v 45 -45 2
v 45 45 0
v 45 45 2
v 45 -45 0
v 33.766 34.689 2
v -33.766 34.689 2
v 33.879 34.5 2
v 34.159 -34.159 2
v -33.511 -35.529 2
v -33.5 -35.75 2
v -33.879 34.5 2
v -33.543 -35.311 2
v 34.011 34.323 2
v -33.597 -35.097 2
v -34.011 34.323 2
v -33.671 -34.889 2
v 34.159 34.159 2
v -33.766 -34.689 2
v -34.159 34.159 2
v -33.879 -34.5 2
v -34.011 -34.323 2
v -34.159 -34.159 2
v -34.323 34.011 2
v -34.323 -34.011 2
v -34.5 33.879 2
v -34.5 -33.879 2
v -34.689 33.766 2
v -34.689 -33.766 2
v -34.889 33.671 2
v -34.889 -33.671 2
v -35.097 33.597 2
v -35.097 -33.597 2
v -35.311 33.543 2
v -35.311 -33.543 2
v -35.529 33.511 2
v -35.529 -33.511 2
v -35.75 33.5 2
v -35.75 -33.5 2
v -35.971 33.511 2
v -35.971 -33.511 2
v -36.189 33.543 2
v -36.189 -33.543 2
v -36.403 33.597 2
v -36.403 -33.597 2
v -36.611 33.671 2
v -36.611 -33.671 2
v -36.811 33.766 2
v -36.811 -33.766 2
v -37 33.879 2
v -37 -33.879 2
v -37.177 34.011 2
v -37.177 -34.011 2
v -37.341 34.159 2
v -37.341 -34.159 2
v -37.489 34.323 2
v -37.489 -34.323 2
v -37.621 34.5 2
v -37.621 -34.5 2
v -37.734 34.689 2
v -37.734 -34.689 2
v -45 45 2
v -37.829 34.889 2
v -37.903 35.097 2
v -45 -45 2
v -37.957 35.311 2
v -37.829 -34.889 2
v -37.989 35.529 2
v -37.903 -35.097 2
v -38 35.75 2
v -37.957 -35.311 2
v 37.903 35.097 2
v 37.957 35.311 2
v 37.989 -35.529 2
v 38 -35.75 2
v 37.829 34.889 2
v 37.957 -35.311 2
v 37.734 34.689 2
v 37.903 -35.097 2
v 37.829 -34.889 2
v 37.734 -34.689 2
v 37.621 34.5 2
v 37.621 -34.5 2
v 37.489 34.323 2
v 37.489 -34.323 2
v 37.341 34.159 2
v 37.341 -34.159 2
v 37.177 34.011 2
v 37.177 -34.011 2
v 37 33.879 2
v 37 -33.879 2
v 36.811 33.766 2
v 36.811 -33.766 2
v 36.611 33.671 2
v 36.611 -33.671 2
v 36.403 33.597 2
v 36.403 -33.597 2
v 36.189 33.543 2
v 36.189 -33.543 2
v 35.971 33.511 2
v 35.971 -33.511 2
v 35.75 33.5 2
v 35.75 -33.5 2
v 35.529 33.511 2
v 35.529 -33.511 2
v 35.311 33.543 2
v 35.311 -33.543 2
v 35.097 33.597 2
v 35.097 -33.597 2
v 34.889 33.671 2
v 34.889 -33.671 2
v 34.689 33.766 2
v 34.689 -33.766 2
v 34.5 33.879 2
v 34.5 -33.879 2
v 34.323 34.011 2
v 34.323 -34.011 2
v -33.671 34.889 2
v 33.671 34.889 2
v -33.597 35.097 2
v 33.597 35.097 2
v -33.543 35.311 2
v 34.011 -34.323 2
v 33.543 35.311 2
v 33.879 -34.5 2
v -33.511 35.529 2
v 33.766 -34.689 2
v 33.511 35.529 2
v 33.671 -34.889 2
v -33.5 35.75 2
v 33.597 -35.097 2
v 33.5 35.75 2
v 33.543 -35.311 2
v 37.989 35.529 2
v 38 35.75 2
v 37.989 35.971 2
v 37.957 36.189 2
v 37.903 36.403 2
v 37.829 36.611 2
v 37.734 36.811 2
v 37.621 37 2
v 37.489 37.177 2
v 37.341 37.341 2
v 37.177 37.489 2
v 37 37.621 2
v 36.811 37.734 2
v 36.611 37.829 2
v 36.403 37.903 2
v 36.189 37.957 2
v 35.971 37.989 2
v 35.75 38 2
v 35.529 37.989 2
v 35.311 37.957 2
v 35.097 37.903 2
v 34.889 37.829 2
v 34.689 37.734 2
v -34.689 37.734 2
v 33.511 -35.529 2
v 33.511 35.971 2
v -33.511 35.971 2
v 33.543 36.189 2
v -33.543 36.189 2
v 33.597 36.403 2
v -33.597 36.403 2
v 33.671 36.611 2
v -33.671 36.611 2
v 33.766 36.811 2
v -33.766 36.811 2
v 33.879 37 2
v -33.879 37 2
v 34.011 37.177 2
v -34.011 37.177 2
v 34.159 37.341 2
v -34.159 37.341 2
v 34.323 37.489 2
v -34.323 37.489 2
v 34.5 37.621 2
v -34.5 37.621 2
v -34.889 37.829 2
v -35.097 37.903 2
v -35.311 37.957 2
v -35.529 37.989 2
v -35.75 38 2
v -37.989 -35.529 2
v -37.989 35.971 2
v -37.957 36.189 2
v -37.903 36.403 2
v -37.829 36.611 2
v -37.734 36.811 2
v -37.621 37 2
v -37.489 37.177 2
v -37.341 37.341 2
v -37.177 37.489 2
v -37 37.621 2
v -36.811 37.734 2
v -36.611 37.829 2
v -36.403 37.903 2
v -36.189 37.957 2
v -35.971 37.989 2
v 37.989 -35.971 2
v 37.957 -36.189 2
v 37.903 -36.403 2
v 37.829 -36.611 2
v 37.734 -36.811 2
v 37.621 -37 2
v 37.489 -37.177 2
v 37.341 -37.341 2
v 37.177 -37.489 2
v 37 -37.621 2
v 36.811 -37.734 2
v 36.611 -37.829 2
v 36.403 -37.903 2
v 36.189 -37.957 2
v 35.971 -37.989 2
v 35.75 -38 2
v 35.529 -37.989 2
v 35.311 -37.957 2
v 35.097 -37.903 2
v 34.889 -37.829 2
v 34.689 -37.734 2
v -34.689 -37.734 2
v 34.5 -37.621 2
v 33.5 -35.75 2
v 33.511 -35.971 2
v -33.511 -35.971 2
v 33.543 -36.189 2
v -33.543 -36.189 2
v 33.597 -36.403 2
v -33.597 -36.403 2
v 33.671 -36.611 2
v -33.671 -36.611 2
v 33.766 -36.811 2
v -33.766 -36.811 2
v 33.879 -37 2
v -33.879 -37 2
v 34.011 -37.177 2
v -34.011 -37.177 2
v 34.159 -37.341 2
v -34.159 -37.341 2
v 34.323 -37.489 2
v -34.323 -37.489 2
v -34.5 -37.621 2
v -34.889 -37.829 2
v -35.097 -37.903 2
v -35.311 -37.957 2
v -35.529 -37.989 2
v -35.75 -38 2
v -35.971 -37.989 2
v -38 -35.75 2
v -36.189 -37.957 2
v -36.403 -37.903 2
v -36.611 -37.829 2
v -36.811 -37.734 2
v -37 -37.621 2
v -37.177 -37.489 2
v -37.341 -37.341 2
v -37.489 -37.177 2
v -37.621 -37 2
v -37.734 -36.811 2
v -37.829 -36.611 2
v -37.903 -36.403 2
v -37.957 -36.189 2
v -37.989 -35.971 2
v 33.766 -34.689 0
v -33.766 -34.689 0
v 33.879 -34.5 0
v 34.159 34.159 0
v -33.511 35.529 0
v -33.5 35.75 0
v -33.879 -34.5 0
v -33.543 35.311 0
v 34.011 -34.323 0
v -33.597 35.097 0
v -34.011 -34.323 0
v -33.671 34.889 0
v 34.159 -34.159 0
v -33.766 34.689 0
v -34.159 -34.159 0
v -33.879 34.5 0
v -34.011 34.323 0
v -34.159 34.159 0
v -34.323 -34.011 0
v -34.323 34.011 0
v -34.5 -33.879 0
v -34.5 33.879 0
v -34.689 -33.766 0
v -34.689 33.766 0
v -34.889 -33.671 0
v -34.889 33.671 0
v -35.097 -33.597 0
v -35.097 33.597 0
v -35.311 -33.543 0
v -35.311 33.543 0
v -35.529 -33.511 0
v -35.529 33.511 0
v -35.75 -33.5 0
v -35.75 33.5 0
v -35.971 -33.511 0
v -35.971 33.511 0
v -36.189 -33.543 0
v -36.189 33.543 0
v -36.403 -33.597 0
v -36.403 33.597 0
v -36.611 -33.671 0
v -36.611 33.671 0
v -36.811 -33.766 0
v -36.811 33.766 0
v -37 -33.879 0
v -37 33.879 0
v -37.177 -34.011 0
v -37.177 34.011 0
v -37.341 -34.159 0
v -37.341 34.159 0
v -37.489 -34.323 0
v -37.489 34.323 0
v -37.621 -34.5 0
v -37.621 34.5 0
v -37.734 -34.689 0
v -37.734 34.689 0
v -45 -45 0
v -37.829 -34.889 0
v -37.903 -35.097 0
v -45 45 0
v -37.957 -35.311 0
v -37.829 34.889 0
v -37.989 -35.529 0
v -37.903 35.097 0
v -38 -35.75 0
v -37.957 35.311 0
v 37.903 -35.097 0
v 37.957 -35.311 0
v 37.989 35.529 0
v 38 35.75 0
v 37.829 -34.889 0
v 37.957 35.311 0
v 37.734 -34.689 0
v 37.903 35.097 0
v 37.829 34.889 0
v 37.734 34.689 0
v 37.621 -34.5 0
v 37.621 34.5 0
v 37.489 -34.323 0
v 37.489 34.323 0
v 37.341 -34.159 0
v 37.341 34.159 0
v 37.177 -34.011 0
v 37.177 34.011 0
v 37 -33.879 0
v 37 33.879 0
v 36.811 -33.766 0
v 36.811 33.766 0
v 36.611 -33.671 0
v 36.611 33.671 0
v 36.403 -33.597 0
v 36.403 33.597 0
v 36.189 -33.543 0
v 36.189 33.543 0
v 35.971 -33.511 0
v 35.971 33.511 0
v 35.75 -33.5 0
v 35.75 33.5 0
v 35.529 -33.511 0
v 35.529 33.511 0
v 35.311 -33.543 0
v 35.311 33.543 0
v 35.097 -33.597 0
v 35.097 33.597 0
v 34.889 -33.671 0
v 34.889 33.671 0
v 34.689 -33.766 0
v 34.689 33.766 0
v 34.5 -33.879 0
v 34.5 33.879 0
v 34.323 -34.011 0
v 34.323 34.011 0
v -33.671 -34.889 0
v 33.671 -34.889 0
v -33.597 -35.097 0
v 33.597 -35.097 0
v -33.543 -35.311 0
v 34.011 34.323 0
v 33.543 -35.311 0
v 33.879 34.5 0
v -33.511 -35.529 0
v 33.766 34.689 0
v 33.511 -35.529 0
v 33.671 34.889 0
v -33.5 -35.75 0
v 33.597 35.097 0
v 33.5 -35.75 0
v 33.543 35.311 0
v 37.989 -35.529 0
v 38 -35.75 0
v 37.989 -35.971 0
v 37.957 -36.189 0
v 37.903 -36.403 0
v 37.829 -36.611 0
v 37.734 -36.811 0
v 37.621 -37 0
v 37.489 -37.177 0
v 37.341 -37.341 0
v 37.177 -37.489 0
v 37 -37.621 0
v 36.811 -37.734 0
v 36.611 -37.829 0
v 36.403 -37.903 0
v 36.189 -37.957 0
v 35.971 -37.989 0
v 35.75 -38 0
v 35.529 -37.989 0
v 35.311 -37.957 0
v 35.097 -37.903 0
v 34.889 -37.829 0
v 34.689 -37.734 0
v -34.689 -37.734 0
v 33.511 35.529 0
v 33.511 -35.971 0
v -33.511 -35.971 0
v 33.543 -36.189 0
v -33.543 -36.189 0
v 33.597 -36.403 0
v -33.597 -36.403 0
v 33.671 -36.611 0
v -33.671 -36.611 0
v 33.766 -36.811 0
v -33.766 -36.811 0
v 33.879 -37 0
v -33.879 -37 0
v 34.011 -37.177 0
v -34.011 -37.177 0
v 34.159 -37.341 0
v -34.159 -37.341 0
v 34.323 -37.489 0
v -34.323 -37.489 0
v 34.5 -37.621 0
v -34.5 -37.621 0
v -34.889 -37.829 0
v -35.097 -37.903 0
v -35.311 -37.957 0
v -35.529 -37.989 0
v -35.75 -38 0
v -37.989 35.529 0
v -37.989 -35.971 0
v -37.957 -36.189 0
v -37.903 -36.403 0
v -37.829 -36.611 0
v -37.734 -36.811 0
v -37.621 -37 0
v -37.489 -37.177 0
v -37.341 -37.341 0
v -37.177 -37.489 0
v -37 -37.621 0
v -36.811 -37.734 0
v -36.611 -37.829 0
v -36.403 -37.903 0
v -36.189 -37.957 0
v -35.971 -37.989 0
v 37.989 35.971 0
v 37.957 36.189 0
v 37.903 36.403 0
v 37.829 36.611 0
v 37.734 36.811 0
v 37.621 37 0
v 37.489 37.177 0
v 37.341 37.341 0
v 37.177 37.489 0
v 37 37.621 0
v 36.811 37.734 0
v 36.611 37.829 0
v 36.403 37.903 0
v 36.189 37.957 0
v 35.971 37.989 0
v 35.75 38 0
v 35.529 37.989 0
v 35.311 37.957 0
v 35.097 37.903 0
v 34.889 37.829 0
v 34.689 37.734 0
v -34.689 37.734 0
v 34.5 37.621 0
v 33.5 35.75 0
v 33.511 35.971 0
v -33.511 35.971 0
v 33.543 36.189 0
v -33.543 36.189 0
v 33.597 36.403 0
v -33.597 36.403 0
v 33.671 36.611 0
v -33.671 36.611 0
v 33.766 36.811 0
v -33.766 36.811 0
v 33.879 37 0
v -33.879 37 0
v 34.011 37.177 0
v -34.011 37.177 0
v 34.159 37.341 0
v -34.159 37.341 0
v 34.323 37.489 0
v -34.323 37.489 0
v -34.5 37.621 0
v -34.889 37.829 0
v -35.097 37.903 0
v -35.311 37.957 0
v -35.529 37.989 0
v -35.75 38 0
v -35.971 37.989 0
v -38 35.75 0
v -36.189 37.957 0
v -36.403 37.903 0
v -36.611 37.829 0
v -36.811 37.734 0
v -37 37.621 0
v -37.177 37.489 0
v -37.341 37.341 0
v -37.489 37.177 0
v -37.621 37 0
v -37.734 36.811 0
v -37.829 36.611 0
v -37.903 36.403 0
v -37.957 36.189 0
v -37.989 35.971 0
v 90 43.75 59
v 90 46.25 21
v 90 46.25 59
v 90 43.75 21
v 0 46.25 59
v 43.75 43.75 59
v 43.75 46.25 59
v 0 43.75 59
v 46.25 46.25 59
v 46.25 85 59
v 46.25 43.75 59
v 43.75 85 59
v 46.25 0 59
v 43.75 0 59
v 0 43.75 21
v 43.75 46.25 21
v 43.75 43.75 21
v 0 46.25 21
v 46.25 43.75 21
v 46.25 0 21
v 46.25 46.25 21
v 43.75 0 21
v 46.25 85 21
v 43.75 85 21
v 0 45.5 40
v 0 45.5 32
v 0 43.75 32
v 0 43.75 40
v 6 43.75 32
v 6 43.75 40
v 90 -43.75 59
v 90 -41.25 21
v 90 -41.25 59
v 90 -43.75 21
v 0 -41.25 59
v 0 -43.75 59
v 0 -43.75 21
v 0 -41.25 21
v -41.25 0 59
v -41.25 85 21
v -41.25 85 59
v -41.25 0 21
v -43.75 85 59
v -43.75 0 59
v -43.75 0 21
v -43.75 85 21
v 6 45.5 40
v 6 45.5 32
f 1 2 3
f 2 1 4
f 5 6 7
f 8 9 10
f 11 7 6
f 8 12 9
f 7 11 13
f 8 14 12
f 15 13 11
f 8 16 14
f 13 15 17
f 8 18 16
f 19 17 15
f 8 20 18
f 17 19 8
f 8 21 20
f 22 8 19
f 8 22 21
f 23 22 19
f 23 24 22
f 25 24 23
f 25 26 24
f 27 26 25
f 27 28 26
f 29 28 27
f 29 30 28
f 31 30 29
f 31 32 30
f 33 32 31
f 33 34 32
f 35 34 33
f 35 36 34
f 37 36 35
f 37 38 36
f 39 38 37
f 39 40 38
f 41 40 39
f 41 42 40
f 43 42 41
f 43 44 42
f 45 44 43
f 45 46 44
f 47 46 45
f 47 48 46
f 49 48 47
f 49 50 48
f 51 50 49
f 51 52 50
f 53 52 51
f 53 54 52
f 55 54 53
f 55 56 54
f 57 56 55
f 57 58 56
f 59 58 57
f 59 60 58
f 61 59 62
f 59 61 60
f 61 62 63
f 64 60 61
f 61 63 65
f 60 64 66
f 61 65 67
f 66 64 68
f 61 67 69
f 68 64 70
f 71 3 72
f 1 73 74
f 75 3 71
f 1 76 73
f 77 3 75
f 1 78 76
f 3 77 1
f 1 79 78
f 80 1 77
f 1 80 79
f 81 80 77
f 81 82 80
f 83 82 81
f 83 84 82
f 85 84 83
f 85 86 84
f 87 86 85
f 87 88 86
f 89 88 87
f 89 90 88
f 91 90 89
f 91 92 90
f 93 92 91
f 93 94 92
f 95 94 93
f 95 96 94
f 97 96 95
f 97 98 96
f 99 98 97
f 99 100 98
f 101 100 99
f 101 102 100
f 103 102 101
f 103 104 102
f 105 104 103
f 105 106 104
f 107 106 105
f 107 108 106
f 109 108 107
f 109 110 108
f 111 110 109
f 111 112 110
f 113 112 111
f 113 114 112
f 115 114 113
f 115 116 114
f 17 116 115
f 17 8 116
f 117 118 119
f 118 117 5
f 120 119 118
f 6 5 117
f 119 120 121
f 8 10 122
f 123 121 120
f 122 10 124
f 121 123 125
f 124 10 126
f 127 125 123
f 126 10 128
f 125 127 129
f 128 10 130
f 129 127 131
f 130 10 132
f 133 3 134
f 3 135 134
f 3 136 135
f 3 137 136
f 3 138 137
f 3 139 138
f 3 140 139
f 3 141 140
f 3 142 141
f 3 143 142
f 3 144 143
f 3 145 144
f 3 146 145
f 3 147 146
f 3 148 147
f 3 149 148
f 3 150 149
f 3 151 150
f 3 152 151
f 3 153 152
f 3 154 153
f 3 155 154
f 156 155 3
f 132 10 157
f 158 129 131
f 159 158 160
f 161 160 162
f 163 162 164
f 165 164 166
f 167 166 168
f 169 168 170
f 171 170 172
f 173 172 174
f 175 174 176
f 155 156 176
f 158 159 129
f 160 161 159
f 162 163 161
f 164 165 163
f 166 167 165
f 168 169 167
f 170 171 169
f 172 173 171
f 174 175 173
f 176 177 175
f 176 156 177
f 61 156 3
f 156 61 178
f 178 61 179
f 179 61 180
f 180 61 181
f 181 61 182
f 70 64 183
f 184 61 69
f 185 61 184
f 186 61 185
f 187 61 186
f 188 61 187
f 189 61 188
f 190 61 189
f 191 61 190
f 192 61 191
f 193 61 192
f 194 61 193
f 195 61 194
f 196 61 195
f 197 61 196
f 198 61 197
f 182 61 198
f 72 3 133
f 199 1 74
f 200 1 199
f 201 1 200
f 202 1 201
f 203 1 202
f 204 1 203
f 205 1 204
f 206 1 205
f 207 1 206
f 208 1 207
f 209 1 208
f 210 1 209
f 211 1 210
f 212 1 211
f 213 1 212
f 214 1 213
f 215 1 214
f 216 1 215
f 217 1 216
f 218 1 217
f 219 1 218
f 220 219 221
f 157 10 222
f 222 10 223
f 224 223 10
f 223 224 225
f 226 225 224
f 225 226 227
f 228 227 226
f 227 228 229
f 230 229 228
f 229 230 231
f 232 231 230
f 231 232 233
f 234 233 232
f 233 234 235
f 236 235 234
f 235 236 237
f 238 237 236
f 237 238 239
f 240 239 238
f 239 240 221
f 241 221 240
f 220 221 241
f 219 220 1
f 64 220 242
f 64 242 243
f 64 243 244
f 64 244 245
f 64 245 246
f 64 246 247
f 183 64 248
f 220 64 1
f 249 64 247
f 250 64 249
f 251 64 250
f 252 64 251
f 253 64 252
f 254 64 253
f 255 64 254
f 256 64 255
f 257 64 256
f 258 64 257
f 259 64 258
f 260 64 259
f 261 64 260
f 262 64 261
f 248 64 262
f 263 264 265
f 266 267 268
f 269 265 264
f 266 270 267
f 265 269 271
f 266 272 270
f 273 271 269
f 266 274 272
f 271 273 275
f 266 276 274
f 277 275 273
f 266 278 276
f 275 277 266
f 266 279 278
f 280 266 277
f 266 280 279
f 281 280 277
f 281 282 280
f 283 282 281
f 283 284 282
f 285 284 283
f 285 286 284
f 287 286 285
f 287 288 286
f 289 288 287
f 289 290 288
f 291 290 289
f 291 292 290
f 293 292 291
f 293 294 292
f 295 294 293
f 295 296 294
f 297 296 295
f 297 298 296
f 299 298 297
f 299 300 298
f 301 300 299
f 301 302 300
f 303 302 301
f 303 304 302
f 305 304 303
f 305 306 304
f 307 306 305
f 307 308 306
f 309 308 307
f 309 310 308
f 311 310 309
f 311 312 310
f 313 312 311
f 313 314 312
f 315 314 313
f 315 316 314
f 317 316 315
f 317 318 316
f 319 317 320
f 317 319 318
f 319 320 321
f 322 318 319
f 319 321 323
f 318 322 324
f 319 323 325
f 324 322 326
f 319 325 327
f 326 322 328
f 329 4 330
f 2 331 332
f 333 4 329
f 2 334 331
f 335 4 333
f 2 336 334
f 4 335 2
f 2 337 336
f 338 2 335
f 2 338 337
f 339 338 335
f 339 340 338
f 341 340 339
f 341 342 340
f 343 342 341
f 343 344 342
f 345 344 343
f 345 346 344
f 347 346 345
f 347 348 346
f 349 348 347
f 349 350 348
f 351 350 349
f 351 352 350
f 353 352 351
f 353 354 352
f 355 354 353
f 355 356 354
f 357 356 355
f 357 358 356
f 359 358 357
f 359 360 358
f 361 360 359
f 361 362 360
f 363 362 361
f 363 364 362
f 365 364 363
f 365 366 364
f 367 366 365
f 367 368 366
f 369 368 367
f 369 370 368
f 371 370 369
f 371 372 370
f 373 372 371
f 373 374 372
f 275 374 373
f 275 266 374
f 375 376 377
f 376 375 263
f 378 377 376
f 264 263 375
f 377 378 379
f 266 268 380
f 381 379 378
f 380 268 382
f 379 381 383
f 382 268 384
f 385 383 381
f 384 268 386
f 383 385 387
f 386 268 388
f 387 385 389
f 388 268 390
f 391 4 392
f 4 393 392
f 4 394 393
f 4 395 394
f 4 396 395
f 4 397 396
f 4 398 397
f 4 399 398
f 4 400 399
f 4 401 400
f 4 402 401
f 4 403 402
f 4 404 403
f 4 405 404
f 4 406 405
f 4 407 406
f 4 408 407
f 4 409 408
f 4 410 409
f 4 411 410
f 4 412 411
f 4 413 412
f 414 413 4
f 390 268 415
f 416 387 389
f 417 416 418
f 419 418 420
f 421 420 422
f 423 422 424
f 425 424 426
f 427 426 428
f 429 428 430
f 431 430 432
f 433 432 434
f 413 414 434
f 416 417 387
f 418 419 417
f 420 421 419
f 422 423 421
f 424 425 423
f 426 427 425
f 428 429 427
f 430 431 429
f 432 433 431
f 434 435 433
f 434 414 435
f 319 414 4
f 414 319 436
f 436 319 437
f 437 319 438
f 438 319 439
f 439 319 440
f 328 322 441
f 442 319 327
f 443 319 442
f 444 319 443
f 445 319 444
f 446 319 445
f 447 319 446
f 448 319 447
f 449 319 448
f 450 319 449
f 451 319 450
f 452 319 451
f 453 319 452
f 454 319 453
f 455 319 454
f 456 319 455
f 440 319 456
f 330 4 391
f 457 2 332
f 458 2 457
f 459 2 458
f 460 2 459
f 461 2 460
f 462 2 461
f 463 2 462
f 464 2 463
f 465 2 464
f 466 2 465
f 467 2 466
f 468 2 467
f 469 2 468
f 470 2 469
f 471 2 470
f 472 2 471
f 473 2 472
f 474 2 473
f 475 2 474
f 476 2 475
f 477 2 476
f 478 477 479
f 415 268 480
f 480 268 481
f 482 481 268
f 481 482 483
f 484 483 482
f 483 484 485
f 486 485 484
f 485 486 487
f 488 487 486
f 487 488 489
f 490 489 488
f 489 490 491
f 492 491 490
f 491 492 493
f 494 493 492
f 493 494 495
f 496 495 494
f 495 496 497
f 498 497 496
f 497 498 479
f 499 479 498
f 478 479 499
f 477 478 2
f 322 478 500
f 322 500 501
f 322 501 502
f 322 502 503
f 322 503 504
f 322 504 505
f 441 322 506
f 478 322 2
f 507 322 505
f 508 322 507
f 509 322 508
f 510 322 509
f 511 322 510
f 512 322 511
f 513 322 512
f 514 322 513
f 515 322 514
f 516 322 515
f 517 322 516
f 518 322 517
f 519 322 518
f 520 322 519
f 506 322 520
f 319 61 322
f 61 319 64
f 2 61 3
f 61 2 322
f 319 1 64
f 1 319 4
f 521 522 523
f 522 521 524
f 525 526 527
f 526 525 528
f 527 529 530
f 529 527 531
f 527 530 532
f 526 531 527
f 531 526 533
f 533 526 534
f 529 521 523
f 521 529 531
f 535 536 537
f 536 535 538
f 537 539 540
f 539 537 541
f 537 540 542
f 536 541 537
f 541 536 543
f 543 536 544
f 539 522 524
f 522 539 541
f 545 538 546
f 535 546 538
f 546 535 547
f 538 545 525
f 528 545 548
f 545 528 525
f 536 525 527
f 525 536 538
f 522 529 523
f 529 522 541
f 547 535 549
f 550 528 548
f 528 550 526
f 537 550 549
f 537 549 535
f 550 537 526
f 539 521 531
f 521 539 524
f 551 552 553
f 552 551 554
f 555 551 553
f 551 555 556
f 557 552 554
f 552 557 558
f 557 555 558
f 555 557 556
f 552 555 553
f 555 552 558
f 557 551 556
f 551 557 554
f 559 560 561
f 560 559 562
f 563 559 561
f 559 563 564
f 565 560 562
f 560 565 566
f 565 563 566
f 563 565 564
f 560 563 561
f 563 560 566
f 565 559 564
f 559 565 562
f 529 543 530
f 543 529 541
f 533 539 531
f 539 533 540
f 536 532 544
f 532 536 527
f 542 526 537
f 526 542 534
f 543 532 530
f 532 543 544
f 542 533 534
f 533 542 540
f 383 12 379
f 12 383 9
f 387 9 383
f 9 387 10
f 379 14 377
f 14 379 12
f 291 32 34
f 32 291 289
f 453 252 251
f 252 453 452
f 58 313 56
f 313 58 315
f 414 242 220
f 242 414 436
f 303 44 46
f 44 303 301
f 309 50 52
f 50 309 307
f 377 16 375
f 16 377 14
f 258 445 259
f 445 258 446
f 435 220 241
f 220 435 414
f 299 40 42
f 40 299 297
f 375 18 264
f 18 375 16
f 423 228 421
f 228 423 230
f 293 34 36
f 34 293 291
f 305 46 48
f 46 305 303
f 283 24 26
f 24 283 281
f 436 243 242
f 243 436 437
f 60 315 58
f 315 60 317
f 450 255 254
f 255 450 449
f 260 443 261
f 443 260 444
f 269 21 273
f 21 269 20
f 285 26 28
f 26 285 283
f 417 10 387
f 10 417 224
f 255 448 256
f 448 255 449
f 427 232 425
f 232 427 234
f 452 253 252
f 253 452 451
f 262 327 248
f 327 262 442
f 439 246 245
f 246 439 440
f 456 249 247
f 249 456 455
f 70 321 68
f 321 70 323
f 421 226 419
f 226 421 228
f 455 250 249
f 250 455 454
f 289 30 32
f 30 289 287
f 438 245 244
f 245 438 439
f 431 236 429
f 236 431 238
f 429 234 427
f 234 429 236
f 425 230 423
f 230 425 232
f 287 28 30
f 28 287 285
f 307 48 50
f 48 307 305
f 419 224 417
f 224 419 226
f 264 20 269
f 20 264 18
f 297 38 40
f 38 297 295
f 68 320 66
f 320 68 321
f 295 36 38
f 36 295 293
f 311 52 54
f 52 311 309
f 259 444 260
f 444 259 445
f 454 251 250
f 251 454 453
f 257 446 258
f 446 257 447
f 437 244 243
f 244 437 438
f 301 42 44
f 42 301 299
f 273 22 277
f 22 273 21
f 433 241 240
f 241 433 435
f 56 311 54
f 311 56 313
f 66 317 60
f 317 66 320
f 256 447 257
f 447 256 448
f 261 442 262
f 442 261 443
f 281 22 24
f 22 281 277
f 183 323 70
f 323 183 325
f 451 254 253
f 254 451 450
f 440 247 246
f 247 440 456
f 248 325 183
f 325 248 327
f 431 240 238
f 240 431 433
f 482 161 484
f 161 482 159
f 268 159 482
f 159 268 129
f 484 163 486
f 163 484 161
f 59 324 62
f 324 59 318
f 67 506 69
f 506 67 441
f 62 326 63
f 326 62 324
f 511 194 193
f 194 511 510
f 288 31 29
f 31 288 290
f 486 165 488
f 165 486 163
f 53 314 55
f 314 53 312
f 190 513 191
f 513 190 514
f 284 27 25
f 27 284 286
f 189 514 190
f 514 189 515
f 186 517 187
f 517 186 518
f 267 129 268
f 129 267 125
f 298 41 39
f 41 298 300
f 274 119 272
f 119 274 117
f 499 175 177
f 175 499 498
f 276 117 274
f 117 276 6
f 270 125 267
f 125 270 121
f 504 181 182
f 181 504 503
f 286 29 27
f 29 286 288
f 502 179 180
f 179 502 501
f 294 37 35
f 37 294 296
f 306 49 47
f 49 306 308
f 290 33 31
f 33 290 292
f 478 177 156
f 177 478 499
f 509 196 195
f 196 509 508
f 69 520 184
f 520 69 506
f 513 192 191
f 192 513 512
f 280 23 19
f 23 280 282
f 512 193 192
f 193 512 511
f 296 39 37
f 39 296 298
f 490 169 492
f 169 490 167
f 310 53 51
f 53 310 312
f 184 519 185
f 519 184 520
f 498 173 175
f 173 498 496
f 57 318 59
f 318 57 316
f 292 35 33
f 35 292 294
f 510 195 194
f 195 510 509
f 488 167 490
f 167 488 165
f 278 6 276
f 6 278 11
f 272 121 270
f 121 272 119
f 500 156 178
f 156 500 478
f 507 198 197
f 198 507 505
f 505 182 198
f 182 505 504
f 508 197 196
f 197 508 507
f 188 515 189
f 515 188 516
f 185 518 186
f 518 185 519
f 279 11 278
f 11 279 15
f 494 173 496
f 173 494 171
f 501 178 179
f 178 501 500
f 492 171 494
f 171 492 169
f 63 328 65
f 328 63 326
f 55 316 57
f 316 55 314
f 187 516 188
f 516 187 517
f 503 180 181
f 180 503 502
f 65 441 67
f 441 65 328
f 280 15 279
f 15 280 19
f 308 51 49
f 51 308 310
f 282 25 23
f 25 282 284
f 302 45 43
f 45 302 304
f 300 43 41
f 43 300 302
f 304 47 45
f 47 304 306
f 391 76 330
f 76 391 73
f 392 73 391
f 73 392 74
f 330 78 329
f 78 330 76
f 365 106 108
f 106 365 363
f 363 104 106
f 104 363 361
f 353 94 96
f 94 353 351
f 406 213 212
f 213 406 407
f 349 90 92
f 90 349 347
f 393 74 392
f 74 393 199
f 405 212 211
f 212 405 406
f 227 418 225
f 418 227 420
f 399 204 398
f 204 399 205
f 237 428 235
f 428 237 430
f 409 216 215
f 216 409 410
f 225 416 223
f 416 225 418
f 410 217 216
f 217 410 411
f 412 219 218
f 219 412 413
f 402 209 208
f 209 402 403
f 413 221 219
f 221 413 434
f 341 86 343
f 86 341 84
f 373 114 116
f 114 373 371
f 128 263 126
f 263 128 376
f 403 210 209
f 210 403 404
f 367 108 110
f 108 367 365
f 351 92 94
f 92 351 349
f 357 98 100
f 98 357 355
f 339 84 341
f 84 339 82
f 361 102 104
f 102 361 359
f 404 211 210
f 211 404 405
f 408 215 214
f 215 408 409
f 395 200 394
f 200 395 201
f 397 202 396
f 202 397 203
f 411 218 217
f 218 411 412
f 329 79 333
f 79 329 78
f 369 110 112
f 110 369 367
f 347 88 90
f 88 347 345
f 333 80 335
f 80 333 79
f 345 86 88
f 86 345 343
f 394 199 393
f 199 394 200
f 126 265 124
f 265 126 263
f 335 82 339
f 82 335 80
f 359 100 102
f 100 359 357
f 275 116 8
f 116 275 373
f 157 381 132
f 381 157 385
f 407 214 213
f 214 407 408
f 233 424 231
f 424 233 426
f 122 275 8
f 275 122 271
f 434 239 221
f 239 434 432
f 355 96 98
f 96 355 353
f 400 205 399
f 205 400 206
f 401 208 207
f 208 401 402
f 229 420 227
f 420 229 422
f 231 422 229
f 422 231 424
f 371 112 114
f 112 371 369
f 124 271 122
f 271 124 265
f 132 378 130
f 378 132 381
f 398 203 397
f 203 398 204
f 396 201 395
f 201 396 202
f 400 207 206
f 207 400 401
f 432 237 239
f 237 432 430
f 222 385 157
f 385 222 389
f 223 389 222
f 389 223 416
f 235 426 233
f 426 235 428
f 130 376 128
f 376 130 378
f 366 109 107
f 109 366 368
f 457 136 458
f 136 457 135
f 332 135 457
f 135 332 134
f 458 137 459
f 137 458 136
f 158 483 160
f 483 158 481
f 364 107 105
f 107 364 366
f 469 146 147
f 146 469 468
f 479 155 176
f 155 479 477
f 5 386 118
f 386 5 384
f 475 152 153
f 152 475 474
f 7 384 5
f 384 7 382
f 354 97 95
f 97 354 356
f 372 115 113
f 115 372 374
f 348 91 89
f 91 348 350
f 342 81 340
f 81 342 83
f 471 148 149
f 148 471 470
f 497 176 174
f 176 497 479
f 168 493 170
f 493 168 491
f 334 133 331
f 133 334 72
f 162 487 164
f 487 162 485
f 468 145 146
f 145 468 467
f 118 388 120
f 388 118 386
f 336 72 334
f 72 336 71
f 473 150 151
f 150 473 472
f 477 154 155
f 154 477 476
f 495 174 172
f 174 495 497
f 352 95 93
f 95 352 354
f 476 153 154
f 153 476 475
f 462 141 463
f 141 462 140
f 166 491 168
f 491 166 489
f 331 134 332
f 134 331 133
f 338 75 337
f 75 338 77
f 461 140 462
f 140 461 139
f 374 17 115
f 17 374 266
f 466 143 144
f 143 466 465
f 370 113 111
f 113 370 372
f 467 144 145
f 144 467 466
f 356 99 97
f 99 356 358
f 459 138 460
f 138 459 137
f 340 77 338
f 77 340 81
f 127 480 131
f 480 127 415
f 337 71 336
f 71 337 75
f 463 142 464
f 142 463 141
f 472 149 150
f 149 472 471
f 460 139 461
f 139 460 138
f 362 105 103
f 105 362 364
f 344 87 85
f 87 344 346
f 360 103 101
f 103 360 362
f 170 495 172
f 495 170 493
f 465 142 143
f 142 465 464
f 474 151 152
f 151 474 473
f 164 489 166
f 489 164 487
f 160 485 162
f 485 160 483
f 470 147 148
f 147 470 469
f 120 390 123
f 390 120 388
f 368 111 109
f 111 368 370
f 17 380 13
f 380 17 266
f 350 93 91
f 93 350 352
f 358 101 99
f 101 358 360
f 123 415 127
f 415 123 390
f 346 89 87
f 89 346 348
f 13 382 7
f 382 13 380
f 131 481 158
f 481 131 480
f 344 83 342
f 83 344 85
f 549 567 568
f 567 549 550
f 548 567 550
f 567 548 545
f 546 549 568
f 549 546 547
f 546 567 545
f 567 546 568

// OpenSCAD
// Dimensions (mm)
top_plate_thickness = 2;
wall_thickness = 2.5;
wall_height = 40;
outer_size = 90;
screw_hole_dia = 4.5;
screw_pattern_size = 71.5;
cable_notch_width = 12;
cable_notch_depth = 8;

// Derived dimensions
inner_size = outer_size - 2 * wall_thickness;
half_outer = outer_size / 2;
half_inner = inner_size / 2;
half_pattern = screw_pattern_size / 2;

$fn = 64;

difference() {
    // Main housing body
    union() {
        // Top plate (rests on bed, z=0 to 2)
        translate([0, 0, top_plate_thickness/2])
            cube([outer_size, outer_size, top_plate_thickness], center = true);
        
        // Four walls rising from top plate to z=40
        // Front wall (positive Y)
        translate([0, half_outer - wall_thickness/2, top_plate_thickness + (wall_height - top_plate_thickness)/2])
            cube([outer_size, wall_thickness, wall_height - top_plate_thickness]);
        
        // Back wall (negative Y)
        translate([0, -half_outer + wall_thickness/2, top_plate_thickness + (wall_height - top_plate_thickness)/2])
            cube([outer_size, wall_thickness, wall_height - top_plate_thickness]);
        
        // Left wall (negative X)
        translate([-half_outer + wall_thickness/2, 0, top_plate_thickness + (wall_height - top_plate_thickness)/2])
            cube([wall_thickness, outer_size - 2*wall_thickness, wall_height - top_plate_thickness]);
        
        // Right wall (positive X)
        translate([half_outer - wall_thickness/2, 0, top_plate_thickness + (wall_height - top_plate_thickness)/2])
            cube([wall_thickness, outer_size - 2*wall_thickness, wall_height - top_plate_thickness]);
    }
    
    // Four M4 screw holes through top plate on 71.5 mm square pattern
    for (x = [-half_pattern, half_pattern]) {
        for (y = [-half_pattern, half_pattern]) {
            translate([x, y, -0.5])
                cylinder(r = screw_hole_dia/2, h = top_plate_thickness + 1, center = false);
        }
    }
    
    // Cable notch in one wall (front wall, positive Y)
    // Notch is 12 mm wide, centered along the wall, reaching 8 mm down from open edge (z=32 to z=40)
    translate([0, half_outer - wall_thickness/2, wall_height - cable_notch_depth/2])
        cube([cable_notch_width, wall_thickness + 1, cable_notch_depth], center = true);
}
